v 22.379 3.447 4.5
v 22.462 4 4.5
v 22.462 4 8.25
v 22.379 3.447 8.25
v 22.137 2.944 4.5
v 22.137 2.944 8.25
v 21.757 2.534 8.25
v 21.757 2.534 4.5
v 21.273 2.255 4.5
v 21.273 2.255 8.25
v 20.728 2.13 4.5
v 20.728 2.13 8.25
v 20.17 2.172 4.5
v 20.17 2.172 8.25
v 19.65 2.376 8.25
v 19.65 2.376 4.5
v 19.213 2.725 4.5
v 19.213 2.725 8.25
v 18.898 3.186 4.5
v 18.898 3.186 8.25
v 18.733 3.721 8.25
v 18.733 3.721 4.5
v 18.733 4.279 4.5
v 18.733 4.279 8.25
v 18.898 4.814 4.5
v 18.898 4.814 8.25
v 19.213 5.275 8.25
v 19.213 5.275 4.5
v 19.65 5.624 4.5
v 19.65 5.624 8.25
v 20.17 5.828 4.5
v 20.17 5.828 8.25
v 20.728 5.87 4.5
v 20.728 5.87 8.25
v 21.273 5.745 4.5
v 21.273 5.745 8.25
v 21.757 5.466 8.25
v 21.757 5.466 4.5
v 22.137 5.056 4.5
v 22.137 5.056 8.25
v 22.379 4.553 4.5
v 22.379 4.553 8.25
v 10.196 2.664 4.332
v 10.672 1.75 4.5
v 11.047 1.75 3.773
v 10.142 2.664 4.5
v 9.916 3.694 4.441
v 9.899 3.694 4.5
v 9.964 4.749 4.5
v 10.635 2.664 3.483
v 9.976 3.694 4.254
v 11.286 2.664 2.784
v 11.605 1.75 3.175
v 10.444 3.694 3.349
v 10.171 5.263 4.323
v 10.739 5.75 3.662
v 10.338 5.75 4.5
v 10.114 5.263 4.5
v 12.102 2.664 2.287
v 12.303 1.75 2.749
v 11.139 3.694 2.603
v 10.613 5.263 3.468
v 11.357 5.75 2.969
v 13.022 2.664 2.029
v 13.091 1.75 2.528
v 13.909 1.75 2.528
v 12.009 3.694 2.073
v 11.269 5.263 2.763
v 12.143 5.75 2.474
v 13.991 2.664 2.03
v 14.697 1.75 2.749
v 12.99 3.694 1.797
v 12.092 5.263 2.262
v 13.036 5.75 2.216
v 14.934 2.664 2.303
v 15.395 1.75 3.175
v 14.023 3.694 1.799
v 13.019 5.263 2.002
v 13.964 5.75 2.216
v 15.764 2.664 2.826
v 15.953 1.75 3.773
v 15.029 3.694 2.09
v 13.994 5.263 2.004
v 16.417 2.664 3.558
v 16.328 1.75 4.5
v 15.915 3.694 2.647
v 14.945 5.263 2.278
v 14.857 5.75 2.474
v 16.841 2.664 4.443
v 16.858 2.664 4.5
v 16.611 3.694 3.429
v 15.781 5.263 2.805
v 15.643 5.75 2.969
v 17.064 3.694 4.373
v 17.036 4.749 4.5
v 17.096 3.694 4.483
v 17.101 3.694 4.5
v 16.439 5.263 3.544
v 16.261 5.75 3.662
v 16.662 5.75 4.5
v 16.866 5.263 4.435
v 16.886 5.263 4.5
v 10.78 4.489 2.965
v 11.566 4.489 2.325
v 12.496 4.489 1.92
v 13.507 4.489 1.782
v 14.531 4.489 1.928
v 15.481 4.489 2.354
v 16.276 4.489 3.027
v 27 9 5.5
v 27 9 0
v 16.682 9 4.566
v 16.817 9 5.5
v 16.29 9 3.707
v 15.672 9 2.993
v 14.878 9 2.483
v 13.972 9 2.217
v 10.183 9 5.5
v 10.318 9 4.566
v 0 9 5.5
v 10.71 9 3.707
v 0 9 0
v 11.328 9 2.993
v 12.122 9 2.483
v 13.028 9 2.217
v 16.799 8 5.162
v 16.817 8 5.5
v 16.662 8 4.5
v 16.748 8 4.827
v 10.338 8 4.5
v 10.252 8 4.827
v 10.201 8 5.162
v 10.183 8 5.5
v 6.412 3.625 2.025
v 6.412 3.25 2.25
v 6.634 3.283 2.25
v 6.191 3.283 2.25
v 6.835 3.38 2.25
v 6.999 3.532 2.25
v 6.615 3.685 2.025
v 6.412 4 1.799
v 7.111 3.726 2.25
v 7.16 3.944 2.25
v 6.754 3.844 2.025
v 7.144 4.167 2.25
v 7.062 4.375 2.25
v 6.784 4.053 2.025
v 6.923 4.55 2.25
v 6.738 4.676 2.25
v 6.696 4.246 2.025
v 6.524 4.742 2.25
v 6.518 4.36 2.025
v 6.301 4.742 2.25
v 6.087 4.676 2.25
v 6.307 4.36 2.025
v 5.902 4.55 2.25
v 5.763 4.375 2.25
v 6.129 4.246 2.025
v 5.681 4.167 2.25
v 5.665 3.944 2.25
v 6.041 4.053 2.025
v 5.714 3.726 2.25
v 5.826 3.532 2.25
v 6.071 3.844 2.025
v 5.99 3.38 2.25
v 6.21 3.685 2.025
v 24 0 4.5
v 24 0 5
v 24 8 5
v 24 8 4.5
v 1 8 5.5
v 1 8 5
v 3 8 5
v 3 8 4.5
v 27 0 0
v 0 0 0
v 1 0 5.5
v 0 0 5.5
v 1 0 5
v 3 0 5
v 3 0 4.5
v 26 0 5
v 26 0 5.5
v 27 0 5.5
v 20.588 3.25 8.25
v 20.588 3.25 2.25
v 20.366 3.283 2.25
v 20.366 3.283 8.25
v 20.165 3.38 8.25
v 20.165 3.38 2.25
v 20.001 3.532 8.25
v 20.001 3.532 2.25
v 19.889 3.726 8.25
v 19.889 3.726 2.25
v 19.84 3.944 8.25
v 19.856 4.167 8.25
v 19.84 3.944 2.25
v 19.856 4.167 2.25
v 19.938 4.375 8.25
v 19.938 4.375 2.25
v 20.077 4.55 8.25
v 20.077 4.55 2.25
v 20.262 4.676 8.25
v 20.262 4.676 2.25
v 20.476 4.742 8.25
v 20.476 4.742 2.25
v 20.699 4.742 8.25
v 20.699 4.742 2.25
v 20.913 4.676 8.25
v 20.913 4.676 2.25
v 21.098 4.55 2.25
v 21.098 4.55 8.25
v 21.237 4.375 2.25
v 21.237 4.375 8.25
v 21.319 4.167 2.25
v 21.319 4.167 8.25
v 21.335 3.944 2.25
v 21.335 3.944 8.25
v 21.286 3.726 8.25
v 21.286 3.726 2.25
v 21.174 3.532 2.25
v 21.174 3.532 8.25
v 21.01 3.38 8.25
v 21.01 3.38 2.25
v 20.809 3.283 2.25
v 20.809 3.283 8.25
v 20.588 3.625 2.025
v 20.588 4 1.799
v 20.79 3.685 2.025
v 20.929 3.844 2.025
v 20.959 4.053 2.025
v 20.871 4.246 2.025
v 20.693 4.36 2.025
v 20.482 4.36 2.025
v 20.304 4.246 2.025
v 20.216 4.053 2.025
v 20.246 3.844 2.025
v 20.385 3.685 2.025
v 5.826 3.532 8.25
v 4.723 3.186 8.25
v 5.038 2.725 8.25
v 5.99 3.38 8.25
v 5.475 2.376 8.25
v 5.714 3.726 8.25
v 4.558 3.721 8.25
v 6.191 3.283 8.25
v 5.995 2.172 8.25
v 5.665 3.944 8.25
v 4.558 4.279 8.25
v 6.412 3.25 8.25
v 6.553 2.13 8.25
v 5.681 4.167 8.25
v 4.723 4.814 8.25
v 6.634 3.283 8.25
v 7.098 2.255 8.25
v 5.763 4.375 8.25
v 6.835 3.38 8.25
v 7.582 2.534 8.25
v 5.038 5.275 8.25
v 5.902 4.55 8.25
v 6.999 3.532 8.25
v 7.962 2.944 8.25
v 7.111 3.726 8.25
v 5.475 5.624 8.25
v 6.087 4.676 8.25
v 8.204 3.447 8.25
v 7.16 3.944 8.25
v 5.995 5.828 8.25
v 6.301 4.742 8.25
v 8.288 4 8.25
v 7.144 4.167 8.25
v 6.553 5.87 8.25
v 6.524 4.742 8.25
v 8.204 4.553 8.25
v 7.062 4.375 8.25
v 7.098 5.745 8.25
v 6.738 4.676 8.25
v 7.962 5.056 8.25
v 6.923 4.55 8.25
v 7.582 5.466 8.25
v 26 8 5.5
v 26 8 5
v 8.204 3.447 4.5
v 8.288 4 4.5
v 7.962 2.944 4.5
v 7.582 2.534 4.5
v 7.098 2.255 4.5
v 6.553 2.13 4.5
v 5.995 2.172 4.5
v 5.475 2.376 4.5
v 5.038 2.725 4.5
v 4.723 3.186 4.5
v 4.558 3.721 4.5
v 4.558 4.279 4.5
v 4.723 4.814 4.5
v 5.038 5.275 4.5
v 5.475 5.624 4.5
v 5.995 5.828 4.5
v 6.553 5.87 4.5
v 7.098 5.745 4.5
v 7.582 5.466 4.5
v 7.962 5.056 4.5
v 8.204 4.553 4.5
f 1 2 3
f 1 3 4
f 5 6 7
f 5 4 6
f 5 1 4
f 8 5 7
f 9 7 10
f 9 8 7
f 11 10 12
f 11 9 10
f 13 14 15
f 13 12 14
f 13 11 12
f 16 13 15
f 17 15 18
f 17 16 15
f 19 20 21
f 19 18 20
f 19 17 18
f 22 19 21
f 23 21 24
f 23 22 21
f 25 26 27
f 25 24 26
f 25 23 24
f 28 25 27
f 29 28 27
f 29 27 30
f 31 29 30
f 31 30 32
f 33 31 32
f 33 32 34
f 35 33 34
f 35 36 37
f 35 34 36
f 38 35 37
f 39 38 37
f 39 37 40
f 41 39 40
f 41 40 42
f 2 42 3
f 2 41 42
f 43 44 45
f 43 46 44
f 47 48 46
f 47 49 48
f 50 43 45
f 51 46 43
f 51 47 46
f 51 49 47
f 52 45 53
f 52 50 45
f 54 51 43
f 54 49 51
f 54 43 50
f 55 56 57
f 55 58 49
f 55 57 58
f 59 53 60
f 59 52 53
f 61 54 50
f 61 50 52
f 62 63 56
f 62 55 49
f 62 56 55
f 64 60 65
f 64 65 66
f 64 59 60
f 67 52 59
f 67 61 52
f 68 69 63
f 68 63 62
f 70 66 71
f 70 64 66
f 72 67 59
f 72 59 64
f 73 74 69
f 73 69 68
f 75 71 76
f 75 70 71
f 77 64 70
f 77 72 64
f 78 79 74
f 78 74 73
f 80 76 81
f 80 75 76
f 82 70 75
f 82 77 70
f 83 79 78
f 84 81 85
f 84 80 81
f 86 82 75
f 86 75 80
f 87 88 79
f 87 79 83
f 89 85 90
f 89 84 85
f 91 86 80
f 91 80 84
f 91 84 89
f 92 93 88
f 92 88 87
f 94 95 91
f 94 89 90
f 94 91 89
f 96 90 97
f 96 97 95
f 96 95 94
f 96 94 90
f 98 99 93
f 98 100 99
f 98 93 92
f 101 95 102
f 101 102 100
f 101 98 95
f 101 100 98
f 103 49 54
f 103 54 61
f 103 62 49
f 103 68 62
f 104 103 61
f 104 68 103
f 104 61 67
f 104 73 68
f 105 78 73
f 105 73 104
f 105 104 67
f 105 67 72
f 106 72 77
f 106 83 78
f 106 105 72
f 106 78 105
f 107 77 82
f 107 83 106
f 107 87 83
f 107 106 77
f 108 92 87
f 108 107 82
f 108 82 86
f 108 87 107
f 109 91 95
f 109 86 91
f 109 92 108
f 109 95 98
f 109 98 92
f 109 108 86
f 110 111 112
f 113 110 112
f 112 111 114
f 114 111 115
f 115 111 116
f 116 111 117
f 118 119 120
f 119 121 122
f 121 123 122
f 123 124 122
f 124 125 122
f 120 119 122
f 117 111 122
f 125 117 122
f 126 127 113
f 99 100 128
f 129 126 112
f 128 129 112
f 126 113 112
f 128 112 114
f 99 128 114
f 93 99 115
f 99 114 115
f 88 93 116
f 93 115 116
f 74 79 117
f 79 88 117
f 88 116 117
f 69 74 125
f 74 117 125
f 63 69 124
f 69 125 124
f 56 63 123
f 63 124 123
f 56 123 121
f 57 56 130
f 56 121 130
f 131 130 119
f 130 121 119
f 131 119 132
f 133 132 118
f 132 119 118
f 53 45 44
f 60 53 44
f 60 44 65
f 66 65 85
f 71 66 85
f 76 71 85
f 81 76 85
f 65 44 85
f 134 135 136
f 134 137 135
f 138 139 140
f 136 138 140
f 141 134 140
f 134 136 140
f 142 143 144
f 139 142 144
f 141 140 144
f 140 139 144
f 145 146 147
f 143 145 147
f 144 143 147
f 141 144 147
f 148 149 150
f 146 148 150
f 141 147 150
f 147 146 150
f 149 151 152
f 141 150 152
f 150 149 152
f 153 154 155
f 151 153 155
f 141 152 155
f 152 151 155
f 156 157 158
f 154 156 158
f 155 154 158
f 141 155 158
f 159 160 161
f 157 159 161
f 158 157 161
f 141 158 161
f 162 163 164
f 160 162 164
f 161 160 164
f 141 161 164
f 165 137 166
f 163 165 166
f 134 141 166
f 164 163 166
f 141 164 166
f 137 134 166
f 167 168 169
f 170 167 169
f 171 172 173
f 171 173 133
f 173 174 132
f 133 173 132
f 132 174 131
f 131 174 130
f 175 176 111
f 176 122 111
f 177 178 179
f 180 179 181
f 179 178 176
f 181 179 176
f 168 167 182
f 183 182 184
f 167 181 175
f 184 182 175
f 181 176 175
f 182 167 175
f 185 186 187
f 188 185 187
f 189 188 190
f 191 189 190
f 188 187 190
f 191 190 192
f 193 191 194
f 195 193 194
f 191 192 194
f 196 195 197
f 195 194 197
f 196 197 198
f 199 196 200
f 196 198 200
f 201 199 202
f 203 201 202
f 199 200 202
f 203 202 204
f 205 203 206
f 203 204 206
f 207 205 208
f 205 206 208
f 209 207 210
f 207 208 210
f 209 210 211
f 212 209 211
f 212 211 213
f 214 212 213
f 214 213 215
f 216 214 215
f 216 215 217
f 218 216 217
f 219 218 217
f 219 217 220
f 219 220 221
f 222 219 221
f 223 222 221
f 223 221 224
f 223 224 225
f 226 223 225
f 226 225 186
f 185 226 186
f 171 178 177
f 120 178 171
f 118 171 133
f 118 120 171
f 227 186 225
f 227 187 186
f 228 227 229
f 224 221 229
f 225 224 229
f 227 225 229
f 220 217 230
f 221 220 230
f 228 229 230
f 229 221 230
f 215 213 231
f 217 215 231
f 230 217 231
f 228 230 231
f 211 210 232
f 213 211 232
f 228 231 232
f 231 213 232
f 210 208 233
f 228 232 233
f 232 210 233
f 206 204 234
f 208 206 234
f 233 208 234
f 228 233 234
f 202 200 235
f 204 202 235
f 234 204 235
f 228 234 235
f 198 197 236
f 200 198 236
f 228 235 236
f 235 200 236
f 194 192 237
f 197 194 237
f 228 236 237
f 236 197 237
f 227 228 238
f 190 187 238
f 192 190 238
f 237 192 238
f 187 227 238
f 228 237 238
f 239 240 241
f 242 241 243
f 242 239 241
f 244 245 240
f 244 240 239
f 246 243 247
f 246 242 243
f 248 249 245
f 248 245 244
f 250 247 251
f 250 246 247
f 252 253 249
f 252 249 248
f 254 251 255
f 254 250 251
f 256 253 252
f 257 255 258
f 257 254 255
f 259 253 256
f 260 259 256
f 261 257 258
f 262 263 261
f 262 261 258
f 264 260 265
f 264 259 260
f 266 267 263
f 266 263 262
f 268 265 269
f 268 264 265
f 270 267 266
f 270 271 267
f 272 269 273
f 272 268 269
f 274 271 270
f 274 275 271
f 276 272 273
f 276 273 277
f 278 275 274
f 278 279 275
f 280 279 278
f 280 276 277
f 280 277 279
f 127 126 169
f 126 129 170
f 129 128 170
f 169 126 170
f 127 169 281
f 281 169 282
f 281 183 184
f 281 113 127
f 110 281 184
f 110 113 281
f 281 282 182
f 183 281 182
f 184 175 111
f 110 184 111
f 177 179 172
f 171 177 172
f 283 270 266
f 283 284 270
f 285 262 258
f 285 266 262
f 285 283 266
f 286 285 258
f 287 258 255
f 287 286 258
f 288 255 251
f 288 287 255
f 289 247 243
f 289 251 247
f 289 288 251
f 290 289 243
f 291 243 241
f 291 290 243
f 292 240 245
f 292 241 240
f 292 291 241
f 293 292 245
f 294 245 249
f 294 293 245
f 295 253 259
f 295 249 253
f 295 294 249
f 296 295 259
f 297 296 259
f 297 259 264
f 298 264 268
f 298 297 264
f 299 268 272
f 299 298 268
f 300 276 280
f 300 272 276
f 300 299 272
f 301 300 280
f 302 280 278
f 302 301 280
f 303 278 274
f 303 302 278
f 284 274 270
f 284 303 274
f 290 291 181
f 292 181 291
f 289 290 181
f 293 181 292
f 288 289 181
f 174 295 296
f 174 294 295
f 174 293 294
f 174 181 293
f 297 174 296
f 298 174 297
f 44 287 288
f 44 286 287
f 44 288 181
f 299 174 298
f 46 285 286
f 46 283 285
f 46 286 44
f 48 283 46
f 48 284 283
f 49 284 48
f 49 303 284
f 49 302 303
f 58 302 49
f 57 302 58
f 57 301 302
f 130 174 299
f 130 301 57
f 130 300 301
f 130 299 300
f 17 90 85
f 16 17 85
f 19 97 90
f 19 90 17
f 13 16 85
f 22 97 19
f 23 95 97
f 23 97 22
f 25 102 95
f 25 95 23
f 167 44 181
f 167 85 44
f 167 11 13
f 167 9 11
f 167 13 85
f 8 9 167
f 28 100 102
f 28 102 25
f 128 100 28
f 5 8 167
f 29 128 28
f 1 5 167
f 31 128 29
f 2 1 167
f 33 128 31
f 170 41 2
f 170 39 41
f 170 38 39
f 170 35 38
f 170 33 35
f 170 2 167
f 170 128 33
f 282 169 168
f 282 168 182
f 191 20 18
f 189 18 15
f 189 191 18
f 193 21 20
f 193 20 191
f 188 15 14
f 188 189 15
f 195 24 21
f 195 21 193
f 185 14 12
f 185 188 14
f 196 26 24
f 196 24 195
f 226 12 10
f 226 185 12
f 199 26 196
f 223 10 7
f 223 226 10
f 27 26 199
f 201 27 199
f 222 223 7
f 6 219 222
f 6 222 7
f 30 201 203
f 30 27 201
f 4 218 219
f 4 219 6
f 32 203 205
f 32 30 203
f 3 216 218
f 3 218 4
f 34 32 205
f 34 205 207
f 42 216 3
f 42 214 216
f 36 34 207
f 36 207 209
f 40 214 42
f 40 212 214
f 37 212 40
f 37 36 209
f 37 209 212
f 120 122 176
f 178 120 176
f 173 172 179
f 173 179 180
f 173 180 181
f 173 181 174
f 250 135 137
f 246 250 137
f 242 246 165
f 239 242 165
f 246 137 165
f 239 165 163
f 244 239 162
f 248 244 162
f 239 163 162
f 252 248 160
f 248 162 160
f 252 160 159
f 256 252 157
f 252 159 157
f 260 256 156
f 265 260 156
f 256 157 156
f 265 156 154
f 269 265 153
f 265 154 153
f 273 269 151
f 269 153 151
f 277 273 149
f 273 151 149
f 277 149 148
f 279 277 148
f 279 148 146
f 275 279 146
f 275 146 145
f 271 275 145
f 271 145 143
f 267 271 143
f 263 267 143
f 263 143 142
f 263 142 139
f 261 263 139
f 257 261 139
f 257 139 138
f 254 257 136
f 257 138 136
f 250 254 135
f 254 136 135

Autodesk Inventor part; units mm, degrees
ref_plane "YZ Plane" through (0, 0, 0) normal (1, 0, 0) x (0, 1, 0)
ref_plane "XZ Plane" through (0, 0, 0) normal (0, 1, 0) x (-1, 0, 0)
ref_plane "XY Plane" through (0, 0, 0) normal (0, 0, 1) x (1, 0, 0)
sketch "Sketch1" plane through (0, 0, 0) normal (0, 0, 1) x (1, 0, 0)
  line L0 (0, 0) -> (27, 0)
  line L1 (27, 0) -> (27, 9)
  line L2 (27, 9) -> (0, 9)
  line L3 (0, 9) -> (0, 0)
  dimension "d0" = 27
  dimension "d1" = 9
extrude "Extrusion1" add sketch "Sketch1" along normal blind 5
sketch "Sketch2" plane through (0, 0, 5) normal (0, 0, 1) x (1, 0, 0)
  line L0 (0, 0) -> (27, 0) projected
  line L1 (0, 0) -> (1, 0)
  line L2 (1, 0) -> (1, 8)
  line L3 (1, 8) -> (26, 8)
  line L4 (26, 8) -> (26, 0)
  line L5 (27, 0) -> (27, 9) projected
  line L6 (27, 0) -> (26, 0)
  line L7 (27, 0) -> (27, 9)
  line L8 (27, 9) -> (0, 9)
  line L9 (0, 9) -> (0, 0) projected
  line L10 (0, 9) -> (0, 0)
  line L11 (13.5, 12) -> (13.5, -6.262) construction
  dimension "d4" = 1
  dimension "d5" = 1
extrude "Extrusion2" add sketch "Sketch2" along normal blind 0.5 contours L9 L8 L5 L0 L4 L3 L2
sketch "Sketch3" plane through (0, 0, 5) normal (0, 0, 1) x (1, 0, 0)
  line L0 (26, 0) -> (26, 8) construction
  line L1 (26, 8) -> (1, 8) construction
  line L2 (1, 8) -> (1, 0) construction
  line L3 (1, 0) -> (26, 0) construction
  line L4 (0, 0) -> (1, 0) construction
  line L5 (1, 0) -> (1, 8) construction
  line L6 (1, 8) -> (26, 8) construction
  line L7 (26, 8) -> (26, 0) construction
  line L8 (26, 0) -> (27, 0) construction
  line L9 (27, 0) -> (27, 9) construction
  line L10 (27, 9) -> (0, 9) construction
  line L11 (0, 9) -> (0, 0) construction
  line L12 (3, 0) -> (24, 0)
  line L13 (0, 0) -> (27, 0) projected
  line L14 (3, 0) -> (3, 8)
  line L15 (24, 0) -> (24, 8)
  line L16 (13.5, 10.7744) -> (13.5, -2.6721) construction
  line L17 (3, 8) -> (24, 8)
  dimension "d8" = 21
extrude "Extrusion3" cut sketch "Sketch3" against normal blind 0.5
sketch "Sketch4" plane through (0, 0, 4.5) normal (0, 0, 1) x (1, 0, 0)
  line L0 (24, 0) -> (3, 0) construction
  line L1 (24, 8) -> (24, 0) construction
  line L2 (3, 8) -> (24, 8) construction
  line L3 (3, 0) -> (3, 8) construction
  line L4 (3, 0) -> (3, 8) construction
  line L5 (3, 8) -> (1, 8) construction
  line L6 (1, 8) -> (1, 0) construction
  line L7 (1, 0) -> (3, 0) construction
  line L8 (24, 8) -> (24, 0) construction
  line L9 (24, 0) -> (26, 0) construction
  line L10 (26, 0) -> (26, 8) construction
  line L11 (26, 8) -> (24, 8) construction
  line L12 (0, 0) -> (1, 0) construction
  line L13 (1, 0) -> (1, 8) construction
  line L14 (1, 8) -> (26, 8) construction
  line L15 (26, 8) -> (26, 0) construction
  line L16 (26, 0) -> (27, 0) construction
  line L17 (27, 0) -> (27, 9) construction
  line L18 (27, 9) -> (0, 9) construction
  line L19 (0, 9) -> (0, 0) construction
  line L20 (13.5, 12.5235) -> (13.5, -4.7396) construction
  circle A0 centre (6.4125, 4) radius 1.875
  circle A1 centre (20.5875, 4) radius 1.875
  point P0 (13.5, 10.4822)
  dimension "d12" = 4
  dimension "d13" = 14.175
  dimension "d14" = 3.75
extrude "Extrusion4" add sketch "Sketch4" along normal blind 3.75
sketch "Sketch5" plane through (6.4125, 4, 8.25) normal (0, 0, 1) x (1, 0, 0)
  circle A0 centre (0, 0) radius 1.875 projected
  circle A1 centre (14.175, 0) radius 1.875 projected
  point P0 (-6.4125, -4)
hole "Hole1" at (6.4125, 4, 8.25) at (20.5875, 4, 8.25) direction (0, 0, -1) diameter 1.5 depth 6 tip angle 118
sketch "Sketch7" plane through (0, 0, 5.5) normal (0, 0, 1) x (1, 0, 0)
  line L0 (0, 0) -> (1, 0) construction
  line L1 (1, 0) -> (1, 8) construction
  line L2 (1, 8) -> (26, 8) construction
  line L3 (26, 8) -> (26, 0) construction
  line L4 (26, 0) -> (27, 0) construction
  line L5 (27, 0) -> (27, 9) construction
  line L6 (27, 9) -> (0, 9) construction
  line L7 (0, 9) -> (0, 0) construction
  circle A0 centre (6.4125, 4) radius 1.875 construction
  circle A1 centre (20.5875, 4) radius 1.875 construction
  line L8 (24, 0) -> (3, 0) construction
  line L9 (24, 8) -> (24, 0) construction
  line L10 (3, 8) -> (24, 8) construction
  line L11 (3, 0) -> (3, 8) construction
  line L12 (24, 8) -> (24, 0) construction
  line L13 (24, 0) -> (26, 0) construction
  line L14 (26, 0) -> (26, 8) construction
  line L15 (26, 8) -> (24, 8) construction
  line L16 (3, 0) -> (3, 8) construction
  line L17 (3, 8) -> (1, 8) construction
  line L18 (1, 8) -> (1, 0) construction
  line L19 (1, 0) -> (3, 0) construction
  line L20 (27, 9) -> (0, 9) construction
  line L21 (13.5, 9) -> (13.5, 1.75)
  line L22 (23, 1.75) -> (16.5, 1.75) construction
  arc A2 (16.5, 1.75) -> (16.8166, 5.75) centre (13.5, 4) ccw
  line L23 (16.5, 1.75) -> (13.5, 1.75)
  line L24 (13.5, 1.75) -> (5.7709, 1.75) construction
  line L25 (16.8166, 5.75) -> (16.8166, 9)
  line L26 (16.8166, 9) -> (13.5, 9)
  line L27 (13.5, 1.75) -> (13.5, 0) construction
  dimension "d28" = 1.75
  dimension "d29" = 3.75
  dimension "d30" = 4
  dimension "d31" = 3
revolve "Revolution1" cut sketch "Sketch7" angle 360 about axis through (13.5, 9, 5.5) along (0, -1, 0)
properties part number "Part2v2"
